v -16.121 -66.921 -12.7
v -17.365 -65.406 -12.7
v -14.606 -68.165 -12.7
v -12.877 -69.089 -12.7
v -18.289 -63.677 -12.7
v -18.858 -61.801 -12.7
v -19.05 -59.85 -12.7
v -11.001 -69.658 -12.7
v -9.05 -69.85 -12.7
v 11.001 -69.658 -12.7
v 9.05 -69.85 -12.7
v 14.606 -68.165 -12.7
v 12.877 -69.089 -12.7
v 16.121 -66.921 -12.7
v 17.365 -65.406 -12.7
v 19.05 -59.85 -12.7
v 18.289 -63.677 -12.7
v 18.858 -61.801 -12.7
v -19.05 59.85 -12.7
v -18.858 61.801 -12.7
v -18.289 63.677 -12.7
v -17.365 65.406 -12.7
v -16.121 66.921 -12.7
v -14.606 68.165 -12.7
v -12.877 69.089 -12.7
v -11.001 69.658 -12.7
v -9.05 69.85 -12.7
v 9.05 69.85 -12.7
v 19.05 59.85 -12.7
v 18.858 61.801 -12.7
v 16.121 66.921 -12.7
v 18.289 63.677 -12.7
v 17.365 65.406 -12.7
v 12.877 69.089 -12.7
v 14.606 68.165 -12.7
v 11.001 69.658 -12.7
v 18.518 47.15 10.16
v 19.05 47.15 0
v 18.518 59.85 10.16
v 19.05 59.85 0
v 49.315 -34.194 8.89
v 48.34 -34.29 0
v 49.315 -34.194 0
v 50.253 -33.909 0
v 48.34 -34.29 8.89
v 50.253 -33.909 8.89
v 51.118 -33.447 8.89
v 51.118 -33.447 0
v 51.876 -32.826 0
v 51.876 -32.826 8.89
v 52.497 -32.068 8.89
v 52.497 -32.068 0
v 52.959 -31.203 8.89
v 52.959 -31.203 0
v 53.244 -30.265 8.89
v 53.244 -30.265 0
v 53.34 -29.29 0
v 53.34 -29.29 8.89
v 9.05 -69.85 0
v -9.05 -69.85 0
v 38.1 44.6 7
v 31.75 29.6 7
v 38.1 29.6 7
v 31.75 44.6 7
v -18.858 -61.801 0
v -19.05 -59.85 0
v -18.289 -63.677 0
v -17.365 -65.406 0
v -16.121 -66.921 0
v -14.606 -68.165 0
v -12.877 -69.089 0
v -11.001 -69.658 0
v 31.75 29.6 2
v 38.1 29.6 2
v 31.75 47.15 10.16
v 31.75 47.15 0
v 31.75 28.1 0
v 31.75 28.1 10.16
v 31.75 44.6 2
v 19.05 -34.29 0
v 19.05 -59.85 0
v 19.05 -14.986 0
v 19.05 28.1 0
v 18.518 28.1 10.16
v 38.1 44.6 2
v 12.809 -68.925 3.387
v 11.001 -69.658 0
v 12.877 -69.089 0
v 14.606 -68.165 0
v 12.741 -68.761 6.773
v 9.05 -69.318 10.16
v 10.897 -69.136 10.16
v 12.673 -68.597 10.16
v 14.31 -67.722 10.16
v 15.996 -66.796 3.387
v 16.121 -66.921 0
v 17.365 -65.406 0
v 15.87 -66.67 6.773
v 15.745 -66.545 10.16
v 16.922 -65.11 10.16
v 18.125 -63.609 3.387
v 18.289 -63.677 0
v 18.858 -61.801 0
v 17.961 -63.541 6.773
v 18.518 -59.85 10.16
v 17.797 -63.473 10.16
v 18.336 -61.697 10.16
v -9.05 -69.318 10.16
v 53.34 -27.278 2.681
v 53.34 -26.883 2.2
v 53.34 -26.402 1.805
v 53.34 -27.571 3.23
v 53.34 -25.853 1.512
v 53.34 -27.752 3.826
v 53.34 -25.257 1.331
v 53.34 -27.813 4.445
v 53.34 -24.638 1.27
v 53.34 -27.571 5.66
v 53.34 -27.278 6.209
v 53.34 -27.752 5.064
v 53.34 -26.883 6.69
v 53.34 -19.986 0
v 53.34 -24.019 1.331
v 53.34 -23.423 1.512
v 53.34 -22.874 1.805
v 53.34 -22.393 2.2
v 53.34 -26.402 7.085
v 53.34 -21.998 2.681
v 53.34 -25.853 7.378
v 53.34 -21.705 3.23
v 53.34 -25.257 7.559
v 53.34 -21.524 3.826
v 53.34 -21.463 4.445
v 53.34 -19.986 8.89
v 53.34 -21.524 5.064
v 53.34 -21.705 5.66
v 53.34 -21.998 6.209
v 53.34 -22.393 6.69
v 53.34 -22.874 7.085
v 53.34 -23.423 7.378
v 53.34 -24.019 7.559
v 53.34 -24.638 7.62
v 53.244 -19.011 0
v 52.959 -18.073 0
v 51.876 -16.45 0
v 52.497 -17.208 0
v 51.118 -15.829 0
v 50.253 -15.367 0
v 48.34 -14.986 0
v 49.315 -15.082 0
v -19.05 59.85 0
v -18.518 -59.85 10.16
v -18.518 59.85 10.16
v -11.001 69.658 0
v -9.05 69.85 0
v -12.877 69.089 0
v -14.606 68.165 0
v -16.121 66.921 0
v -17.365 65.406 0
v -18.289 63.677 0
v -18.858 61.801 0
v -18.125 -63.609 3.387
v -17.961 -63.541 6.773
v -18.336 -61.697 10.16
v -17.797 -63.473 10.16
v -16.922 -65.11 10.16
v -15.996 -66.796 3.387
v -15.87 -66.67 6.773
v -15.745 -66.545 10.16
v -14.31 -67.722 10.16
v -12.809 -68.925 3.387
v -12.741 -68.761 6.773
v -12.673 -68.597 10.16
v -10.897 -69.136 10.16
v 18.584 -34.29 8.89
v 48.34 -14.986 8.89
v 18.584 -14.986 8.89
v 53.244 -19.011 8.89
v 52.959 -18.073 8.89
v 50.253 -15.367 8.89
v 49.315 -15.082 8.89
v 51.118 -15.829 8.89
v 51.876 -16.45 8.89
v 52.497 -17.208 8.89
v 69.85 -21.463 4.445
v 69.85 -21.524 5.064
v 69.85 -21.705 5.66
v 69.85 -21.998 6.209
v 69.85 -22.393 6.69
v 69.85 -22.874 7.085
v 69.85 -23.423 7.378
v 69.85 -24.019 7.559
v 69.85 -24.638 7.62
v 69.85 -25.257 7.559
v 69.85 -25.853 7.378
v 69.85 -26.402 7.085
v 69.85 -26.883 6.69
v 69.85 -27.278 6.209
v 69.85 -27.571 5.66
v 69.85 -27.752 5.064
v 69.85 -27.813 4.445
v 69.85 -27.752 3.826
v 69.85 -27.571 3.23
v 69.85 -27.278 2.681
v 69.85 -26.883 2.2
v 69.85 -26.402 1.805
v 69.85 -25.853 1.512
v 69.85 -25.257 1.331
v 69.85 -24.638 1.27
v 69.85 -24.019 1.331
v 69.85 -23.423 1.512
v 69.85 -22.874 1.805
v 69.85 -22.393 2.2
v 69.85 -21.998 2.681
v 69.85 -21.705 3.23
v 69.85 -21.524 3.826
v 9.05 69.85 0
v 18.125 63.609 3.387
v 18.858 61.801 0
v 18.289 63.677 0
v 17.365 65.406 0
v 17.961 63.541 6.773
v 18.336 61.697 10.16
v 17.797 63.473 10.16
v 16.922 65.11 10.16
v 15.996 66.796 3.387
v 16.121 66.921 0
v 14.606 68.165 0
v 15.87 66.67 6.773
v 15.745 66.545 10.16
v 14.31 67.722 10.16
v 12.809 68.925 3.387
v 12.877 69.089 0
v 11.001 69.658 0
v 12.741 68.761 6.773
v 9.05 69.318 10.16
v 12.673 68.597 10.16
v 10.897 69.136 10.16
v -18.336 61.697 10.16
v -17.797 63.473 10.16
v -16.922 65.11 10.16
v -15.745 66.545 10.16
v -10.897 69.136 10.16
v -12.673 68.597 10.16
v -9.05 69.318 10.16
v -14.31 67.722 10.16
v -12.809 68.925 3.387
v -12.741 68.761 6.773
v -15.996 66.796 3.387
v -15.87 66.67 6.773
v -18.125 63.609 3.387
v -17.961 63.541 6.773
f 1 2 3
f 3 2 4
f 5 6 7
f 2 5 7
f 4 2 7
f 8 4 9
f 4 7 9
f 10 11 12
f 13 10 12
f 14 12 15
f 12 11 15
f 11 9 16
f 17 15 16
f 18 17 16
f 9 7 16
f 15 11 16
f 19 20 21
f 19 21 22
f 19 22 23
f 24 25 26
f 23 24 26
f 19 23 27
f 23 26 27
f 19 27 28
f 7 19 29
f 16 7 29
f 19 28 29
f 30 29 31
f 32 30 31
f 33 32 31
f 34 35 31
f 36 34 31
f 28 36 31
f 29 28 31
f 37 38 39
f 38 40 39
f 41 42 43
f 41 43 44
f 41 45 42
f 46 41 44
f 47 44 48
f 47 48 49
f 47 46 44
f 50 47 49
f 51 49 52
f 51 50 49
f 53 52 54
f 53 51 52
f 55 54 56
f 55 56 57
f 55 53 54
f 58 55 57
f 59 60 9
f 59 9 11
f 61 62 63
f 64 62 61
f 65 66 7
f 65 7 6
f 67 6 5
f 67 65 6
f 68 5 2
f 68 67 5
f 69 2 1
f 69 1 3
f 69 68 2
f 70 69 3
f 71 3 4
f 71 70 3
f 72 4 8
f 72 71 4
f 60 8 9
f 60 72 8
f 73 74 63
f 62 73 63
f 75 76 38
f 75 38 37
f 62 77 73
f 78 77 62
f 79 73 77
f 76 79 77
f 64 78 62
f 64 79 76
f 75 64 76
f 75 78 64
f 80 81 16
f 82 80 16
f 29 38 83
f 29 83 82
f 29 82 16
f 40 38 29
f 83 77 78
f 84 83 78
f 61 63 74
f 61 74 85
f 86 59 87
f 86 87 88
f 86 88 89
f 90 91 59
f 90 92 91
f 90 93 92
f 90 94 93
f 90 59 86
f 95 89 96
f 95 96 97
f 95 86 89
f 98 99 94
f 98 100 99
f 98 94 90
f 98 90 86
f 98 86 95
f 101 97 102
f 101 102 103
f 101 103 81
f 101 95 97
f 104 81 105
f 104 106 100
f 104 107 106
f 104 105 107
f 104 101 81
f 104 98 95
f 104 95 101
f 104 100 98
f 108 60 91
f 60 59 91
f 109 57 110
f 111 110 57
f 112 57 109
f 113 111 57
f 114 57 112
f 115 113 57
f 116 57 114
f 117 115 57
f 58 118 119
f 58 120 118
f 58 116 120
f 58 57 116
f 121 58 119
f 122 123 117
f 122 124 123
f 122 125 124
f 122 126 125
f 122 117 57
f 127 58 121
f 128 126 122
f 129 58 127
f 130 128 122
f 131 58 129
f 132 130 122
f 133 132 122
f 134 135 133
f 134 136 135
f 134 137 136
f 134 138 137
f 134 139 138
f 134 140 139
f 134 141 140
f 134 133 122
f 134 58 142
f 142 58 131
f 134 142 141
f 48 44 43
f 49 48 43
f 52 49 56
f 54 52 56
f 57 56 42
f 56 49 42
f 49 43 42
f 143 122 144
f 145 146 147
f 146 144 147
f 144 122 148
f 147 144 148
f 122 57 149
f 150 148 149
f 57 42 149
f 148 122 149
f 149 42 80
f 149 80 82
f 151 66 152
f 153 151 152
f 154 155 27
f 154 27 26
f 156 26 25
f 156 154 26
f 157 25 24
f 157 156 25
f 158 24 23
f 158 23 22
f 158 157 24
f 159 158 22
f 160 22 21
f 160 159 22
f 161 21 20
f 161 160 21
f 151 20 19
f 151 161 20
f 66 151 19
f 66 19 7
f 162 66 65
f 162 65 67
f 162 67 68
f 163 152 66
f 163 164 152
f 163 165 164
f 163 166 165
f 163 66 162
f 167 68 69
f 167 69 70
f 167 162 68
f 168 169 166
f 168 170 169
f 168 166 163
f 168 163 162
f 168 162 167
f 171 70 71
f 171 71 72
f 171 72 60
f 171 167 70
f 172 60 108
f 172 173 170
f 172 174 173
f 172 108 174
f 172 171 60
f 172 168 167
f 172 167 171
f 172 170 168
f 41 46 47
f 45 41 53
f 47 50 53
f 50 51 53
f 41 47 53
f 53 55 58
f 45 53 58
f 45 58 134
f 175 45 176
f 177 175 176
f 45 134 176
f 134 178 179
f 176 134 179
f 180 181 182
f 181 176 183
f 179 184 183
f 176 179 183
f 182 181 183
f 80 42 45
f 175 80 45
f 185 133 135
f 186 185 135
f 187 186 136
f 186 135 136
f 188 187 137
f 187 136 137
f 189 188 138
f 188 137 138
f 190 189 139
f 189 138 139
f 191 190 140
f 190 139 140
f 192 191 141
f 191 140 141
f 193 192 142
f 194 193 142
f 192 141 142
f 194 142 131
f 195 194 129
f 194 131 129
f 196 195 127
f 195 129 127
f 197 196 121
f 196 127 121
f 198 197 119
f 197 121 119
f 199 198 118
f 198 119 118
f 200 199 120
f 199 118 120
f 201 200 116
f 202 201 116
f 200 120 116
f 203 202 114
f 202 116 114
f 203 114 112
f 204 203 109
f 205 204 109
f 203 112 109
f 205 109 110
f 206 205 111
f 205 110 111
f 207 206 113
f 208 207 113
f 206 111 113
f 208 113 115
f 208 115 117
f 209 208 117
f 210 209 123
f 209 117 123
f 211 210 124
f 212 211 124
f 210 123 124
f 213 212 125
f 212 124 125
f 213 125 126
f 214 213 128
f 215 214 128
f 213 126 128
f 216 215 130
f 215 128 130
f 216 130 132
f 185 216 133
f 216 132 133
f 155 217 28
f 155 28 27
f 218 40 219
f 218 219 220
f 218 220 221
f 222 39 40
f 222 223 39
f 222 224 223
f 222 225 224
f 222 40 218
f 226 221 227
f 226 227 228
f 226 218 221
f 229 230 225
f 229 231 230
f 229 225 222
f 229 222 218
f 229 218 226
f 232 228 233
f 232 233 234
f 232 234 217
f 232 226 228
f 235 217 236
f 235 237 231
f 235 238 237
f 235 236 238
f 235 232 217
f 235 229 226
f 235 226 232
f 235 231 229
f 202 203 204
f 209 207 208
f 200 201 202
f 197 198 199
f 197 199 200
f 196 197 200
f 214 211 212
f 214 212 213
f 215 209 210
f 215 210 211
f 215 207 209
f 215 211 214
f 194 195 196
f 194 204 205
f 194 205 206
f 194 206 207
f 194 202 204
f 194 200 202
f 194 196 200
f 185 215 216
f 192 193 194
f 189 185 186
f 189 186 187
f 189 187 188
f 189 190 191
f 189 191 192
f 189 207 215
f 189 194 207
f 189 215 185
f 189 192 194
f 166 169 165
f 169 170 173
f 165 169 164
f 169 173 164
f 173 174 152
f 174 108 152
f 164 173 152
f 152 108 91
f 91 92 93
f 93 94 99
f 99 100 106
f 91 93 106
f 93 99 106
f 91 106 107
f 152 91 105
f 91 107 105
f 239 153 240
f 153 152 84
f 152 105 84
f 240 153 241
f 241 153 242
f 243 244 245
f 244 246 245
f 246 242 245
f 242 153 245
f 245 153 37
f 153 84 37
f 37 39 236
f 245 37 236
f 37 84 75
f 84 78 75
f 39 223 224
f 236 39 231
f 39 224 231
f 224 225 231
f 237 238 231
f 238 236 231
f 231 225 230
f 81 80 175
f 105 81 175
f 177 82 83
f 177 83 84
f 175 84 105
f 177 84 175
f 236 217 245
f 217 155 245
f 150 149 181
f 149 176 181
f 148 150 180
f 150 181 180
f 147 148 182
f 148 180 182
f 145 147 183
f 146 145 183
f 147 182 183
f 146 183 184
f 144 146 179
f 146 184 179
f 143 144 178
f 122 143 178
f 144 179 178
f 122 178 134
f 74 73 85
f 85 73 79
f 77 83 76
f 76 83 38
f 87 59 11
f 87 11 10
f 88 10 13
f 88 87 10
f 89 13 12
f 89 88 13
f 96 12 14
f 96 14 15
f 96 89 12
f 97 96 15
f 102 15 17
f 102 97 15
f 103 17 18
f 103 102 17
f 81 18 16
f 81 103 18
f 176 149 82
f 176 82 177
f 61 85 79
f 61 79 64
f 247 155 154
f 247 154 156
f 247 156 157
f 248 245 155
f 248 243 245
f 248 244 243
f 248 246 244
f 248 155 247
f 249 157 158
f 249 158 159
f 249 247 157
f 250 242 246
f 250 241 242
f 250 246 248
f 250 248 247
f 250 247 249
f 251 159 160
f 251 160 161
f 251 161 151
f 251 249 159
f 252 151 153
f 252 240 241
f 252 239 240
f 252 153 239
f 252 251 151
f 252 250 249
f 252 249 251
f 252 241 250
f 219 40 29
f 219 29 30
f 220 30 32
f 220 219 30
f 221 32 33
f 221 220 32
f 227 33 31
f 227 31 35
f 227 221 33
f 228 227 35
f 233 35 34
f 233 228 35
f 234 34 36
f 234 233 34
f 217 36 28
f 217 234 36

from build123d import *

# Parameters (mm, degrees)
F1_DEPTH      = 12.7
F1_DEPTH_BACK = 10.16
F1_TAPER_BACK = 3
F2_W          = 19.304
F2_H          = 8.89
F3_DEPTH      = 34.29
F3_DEPTH_BACK = 0.4659051578
F4_R          = 5
F5_R          = 3.175
F6_DEPTH      = 16.51
F7_W          = 19.05
F7_H          = 10.16
F8_DEPTH      = 12.7
F8_DEPTH_BACK = 0.5324630375
F9_W          = 15
F9_H          = 5
F10_DEPTH     = 6.35


with BuildPart() as f1:
    # F0 (on Top) → F1 (new body, two sides)
    with BuildSketch(Plane.XY) as f1_sk:
        with BuildLine():
            Line((9.05, 69.85), (-9.05, 69.85))
            ThreePointArc((-9.05, 69.85), (-16.1210678119, 66.9210678119), (-19.05, 59.85))
            Line((-19.05, 59.85), (-19.05, -59.85))
            ThreePointArc((-19.05, -59.85), (-16.1210678119, -66.9210678119), (-9.05, -69.85))
            Line((-9.05, -69.85), (9.05, -69.85))
            ThreePointArc((9.05, -69.85), (16.1210678119, -66.9210678119), (19.05, -59.85))
            Line((19.05, -59.85), (19.05, 59.85))
            ThreePointArc((19.05, 59.85), (16.1210678119, 66.9210678119), (9.05, 69.85))
        make_face()
    extrude(amount=-F1_DEPTH)
    extrude(f1_sk.sketch, amount=F1_DEPTH_BACK, taper=F1_TAPER_BACK)

    # F2 (on face) → F3 (join, two sides)
    with BuildSketch(Plane.YZ.offset(19.05)) as f3_sk:
        with Locations((-24.638, 4.445)):
            Rectangle(F2_W, F2_H)
    extrude(amount=F3_DEPTH)
    extrude(f3_sk.sketch, amount=-F3_DEPTH_BACK)

    # F4
    f4_edges = [f1.edges().sort_by_distance(p)[0] for p in [
        (53.34, -34.29, 4.445),
        (53.34, -14.986, 4.445),
    ]]
    fillet(f4_edges, radius=F4_R)

    # F5 (on face) → F6 (join)
    with BuildSketch(Plane.YZ.offset(53.34)):
        with Locations((-24.638, 4.445)):
            Circle(F5_R)
    extrude(amount=F6_DEPTH)

    # F7 (on face) → F8 (join, two sides)
    with BuildSketch(Plane.YZ.offset(19.05)) as f8_sk:
        with Locations((37.625, 5.08)):
            Rectangle(F7_W, F7_H)
    extrude(amount=F8_DEPTH)
    extrude(f8_sk.sketch, amount=-F8_DEPTH_BACK)

    # F9 (on face) → F10 (join)
    with BuildSketch(Plane.YZ.offset(31.75)):
        with Locations((37.1, 4.5)):
            Rectangle(F9_W, F9_H)
    extrude(amount=F10_DEPTH)


solid = f1.part
